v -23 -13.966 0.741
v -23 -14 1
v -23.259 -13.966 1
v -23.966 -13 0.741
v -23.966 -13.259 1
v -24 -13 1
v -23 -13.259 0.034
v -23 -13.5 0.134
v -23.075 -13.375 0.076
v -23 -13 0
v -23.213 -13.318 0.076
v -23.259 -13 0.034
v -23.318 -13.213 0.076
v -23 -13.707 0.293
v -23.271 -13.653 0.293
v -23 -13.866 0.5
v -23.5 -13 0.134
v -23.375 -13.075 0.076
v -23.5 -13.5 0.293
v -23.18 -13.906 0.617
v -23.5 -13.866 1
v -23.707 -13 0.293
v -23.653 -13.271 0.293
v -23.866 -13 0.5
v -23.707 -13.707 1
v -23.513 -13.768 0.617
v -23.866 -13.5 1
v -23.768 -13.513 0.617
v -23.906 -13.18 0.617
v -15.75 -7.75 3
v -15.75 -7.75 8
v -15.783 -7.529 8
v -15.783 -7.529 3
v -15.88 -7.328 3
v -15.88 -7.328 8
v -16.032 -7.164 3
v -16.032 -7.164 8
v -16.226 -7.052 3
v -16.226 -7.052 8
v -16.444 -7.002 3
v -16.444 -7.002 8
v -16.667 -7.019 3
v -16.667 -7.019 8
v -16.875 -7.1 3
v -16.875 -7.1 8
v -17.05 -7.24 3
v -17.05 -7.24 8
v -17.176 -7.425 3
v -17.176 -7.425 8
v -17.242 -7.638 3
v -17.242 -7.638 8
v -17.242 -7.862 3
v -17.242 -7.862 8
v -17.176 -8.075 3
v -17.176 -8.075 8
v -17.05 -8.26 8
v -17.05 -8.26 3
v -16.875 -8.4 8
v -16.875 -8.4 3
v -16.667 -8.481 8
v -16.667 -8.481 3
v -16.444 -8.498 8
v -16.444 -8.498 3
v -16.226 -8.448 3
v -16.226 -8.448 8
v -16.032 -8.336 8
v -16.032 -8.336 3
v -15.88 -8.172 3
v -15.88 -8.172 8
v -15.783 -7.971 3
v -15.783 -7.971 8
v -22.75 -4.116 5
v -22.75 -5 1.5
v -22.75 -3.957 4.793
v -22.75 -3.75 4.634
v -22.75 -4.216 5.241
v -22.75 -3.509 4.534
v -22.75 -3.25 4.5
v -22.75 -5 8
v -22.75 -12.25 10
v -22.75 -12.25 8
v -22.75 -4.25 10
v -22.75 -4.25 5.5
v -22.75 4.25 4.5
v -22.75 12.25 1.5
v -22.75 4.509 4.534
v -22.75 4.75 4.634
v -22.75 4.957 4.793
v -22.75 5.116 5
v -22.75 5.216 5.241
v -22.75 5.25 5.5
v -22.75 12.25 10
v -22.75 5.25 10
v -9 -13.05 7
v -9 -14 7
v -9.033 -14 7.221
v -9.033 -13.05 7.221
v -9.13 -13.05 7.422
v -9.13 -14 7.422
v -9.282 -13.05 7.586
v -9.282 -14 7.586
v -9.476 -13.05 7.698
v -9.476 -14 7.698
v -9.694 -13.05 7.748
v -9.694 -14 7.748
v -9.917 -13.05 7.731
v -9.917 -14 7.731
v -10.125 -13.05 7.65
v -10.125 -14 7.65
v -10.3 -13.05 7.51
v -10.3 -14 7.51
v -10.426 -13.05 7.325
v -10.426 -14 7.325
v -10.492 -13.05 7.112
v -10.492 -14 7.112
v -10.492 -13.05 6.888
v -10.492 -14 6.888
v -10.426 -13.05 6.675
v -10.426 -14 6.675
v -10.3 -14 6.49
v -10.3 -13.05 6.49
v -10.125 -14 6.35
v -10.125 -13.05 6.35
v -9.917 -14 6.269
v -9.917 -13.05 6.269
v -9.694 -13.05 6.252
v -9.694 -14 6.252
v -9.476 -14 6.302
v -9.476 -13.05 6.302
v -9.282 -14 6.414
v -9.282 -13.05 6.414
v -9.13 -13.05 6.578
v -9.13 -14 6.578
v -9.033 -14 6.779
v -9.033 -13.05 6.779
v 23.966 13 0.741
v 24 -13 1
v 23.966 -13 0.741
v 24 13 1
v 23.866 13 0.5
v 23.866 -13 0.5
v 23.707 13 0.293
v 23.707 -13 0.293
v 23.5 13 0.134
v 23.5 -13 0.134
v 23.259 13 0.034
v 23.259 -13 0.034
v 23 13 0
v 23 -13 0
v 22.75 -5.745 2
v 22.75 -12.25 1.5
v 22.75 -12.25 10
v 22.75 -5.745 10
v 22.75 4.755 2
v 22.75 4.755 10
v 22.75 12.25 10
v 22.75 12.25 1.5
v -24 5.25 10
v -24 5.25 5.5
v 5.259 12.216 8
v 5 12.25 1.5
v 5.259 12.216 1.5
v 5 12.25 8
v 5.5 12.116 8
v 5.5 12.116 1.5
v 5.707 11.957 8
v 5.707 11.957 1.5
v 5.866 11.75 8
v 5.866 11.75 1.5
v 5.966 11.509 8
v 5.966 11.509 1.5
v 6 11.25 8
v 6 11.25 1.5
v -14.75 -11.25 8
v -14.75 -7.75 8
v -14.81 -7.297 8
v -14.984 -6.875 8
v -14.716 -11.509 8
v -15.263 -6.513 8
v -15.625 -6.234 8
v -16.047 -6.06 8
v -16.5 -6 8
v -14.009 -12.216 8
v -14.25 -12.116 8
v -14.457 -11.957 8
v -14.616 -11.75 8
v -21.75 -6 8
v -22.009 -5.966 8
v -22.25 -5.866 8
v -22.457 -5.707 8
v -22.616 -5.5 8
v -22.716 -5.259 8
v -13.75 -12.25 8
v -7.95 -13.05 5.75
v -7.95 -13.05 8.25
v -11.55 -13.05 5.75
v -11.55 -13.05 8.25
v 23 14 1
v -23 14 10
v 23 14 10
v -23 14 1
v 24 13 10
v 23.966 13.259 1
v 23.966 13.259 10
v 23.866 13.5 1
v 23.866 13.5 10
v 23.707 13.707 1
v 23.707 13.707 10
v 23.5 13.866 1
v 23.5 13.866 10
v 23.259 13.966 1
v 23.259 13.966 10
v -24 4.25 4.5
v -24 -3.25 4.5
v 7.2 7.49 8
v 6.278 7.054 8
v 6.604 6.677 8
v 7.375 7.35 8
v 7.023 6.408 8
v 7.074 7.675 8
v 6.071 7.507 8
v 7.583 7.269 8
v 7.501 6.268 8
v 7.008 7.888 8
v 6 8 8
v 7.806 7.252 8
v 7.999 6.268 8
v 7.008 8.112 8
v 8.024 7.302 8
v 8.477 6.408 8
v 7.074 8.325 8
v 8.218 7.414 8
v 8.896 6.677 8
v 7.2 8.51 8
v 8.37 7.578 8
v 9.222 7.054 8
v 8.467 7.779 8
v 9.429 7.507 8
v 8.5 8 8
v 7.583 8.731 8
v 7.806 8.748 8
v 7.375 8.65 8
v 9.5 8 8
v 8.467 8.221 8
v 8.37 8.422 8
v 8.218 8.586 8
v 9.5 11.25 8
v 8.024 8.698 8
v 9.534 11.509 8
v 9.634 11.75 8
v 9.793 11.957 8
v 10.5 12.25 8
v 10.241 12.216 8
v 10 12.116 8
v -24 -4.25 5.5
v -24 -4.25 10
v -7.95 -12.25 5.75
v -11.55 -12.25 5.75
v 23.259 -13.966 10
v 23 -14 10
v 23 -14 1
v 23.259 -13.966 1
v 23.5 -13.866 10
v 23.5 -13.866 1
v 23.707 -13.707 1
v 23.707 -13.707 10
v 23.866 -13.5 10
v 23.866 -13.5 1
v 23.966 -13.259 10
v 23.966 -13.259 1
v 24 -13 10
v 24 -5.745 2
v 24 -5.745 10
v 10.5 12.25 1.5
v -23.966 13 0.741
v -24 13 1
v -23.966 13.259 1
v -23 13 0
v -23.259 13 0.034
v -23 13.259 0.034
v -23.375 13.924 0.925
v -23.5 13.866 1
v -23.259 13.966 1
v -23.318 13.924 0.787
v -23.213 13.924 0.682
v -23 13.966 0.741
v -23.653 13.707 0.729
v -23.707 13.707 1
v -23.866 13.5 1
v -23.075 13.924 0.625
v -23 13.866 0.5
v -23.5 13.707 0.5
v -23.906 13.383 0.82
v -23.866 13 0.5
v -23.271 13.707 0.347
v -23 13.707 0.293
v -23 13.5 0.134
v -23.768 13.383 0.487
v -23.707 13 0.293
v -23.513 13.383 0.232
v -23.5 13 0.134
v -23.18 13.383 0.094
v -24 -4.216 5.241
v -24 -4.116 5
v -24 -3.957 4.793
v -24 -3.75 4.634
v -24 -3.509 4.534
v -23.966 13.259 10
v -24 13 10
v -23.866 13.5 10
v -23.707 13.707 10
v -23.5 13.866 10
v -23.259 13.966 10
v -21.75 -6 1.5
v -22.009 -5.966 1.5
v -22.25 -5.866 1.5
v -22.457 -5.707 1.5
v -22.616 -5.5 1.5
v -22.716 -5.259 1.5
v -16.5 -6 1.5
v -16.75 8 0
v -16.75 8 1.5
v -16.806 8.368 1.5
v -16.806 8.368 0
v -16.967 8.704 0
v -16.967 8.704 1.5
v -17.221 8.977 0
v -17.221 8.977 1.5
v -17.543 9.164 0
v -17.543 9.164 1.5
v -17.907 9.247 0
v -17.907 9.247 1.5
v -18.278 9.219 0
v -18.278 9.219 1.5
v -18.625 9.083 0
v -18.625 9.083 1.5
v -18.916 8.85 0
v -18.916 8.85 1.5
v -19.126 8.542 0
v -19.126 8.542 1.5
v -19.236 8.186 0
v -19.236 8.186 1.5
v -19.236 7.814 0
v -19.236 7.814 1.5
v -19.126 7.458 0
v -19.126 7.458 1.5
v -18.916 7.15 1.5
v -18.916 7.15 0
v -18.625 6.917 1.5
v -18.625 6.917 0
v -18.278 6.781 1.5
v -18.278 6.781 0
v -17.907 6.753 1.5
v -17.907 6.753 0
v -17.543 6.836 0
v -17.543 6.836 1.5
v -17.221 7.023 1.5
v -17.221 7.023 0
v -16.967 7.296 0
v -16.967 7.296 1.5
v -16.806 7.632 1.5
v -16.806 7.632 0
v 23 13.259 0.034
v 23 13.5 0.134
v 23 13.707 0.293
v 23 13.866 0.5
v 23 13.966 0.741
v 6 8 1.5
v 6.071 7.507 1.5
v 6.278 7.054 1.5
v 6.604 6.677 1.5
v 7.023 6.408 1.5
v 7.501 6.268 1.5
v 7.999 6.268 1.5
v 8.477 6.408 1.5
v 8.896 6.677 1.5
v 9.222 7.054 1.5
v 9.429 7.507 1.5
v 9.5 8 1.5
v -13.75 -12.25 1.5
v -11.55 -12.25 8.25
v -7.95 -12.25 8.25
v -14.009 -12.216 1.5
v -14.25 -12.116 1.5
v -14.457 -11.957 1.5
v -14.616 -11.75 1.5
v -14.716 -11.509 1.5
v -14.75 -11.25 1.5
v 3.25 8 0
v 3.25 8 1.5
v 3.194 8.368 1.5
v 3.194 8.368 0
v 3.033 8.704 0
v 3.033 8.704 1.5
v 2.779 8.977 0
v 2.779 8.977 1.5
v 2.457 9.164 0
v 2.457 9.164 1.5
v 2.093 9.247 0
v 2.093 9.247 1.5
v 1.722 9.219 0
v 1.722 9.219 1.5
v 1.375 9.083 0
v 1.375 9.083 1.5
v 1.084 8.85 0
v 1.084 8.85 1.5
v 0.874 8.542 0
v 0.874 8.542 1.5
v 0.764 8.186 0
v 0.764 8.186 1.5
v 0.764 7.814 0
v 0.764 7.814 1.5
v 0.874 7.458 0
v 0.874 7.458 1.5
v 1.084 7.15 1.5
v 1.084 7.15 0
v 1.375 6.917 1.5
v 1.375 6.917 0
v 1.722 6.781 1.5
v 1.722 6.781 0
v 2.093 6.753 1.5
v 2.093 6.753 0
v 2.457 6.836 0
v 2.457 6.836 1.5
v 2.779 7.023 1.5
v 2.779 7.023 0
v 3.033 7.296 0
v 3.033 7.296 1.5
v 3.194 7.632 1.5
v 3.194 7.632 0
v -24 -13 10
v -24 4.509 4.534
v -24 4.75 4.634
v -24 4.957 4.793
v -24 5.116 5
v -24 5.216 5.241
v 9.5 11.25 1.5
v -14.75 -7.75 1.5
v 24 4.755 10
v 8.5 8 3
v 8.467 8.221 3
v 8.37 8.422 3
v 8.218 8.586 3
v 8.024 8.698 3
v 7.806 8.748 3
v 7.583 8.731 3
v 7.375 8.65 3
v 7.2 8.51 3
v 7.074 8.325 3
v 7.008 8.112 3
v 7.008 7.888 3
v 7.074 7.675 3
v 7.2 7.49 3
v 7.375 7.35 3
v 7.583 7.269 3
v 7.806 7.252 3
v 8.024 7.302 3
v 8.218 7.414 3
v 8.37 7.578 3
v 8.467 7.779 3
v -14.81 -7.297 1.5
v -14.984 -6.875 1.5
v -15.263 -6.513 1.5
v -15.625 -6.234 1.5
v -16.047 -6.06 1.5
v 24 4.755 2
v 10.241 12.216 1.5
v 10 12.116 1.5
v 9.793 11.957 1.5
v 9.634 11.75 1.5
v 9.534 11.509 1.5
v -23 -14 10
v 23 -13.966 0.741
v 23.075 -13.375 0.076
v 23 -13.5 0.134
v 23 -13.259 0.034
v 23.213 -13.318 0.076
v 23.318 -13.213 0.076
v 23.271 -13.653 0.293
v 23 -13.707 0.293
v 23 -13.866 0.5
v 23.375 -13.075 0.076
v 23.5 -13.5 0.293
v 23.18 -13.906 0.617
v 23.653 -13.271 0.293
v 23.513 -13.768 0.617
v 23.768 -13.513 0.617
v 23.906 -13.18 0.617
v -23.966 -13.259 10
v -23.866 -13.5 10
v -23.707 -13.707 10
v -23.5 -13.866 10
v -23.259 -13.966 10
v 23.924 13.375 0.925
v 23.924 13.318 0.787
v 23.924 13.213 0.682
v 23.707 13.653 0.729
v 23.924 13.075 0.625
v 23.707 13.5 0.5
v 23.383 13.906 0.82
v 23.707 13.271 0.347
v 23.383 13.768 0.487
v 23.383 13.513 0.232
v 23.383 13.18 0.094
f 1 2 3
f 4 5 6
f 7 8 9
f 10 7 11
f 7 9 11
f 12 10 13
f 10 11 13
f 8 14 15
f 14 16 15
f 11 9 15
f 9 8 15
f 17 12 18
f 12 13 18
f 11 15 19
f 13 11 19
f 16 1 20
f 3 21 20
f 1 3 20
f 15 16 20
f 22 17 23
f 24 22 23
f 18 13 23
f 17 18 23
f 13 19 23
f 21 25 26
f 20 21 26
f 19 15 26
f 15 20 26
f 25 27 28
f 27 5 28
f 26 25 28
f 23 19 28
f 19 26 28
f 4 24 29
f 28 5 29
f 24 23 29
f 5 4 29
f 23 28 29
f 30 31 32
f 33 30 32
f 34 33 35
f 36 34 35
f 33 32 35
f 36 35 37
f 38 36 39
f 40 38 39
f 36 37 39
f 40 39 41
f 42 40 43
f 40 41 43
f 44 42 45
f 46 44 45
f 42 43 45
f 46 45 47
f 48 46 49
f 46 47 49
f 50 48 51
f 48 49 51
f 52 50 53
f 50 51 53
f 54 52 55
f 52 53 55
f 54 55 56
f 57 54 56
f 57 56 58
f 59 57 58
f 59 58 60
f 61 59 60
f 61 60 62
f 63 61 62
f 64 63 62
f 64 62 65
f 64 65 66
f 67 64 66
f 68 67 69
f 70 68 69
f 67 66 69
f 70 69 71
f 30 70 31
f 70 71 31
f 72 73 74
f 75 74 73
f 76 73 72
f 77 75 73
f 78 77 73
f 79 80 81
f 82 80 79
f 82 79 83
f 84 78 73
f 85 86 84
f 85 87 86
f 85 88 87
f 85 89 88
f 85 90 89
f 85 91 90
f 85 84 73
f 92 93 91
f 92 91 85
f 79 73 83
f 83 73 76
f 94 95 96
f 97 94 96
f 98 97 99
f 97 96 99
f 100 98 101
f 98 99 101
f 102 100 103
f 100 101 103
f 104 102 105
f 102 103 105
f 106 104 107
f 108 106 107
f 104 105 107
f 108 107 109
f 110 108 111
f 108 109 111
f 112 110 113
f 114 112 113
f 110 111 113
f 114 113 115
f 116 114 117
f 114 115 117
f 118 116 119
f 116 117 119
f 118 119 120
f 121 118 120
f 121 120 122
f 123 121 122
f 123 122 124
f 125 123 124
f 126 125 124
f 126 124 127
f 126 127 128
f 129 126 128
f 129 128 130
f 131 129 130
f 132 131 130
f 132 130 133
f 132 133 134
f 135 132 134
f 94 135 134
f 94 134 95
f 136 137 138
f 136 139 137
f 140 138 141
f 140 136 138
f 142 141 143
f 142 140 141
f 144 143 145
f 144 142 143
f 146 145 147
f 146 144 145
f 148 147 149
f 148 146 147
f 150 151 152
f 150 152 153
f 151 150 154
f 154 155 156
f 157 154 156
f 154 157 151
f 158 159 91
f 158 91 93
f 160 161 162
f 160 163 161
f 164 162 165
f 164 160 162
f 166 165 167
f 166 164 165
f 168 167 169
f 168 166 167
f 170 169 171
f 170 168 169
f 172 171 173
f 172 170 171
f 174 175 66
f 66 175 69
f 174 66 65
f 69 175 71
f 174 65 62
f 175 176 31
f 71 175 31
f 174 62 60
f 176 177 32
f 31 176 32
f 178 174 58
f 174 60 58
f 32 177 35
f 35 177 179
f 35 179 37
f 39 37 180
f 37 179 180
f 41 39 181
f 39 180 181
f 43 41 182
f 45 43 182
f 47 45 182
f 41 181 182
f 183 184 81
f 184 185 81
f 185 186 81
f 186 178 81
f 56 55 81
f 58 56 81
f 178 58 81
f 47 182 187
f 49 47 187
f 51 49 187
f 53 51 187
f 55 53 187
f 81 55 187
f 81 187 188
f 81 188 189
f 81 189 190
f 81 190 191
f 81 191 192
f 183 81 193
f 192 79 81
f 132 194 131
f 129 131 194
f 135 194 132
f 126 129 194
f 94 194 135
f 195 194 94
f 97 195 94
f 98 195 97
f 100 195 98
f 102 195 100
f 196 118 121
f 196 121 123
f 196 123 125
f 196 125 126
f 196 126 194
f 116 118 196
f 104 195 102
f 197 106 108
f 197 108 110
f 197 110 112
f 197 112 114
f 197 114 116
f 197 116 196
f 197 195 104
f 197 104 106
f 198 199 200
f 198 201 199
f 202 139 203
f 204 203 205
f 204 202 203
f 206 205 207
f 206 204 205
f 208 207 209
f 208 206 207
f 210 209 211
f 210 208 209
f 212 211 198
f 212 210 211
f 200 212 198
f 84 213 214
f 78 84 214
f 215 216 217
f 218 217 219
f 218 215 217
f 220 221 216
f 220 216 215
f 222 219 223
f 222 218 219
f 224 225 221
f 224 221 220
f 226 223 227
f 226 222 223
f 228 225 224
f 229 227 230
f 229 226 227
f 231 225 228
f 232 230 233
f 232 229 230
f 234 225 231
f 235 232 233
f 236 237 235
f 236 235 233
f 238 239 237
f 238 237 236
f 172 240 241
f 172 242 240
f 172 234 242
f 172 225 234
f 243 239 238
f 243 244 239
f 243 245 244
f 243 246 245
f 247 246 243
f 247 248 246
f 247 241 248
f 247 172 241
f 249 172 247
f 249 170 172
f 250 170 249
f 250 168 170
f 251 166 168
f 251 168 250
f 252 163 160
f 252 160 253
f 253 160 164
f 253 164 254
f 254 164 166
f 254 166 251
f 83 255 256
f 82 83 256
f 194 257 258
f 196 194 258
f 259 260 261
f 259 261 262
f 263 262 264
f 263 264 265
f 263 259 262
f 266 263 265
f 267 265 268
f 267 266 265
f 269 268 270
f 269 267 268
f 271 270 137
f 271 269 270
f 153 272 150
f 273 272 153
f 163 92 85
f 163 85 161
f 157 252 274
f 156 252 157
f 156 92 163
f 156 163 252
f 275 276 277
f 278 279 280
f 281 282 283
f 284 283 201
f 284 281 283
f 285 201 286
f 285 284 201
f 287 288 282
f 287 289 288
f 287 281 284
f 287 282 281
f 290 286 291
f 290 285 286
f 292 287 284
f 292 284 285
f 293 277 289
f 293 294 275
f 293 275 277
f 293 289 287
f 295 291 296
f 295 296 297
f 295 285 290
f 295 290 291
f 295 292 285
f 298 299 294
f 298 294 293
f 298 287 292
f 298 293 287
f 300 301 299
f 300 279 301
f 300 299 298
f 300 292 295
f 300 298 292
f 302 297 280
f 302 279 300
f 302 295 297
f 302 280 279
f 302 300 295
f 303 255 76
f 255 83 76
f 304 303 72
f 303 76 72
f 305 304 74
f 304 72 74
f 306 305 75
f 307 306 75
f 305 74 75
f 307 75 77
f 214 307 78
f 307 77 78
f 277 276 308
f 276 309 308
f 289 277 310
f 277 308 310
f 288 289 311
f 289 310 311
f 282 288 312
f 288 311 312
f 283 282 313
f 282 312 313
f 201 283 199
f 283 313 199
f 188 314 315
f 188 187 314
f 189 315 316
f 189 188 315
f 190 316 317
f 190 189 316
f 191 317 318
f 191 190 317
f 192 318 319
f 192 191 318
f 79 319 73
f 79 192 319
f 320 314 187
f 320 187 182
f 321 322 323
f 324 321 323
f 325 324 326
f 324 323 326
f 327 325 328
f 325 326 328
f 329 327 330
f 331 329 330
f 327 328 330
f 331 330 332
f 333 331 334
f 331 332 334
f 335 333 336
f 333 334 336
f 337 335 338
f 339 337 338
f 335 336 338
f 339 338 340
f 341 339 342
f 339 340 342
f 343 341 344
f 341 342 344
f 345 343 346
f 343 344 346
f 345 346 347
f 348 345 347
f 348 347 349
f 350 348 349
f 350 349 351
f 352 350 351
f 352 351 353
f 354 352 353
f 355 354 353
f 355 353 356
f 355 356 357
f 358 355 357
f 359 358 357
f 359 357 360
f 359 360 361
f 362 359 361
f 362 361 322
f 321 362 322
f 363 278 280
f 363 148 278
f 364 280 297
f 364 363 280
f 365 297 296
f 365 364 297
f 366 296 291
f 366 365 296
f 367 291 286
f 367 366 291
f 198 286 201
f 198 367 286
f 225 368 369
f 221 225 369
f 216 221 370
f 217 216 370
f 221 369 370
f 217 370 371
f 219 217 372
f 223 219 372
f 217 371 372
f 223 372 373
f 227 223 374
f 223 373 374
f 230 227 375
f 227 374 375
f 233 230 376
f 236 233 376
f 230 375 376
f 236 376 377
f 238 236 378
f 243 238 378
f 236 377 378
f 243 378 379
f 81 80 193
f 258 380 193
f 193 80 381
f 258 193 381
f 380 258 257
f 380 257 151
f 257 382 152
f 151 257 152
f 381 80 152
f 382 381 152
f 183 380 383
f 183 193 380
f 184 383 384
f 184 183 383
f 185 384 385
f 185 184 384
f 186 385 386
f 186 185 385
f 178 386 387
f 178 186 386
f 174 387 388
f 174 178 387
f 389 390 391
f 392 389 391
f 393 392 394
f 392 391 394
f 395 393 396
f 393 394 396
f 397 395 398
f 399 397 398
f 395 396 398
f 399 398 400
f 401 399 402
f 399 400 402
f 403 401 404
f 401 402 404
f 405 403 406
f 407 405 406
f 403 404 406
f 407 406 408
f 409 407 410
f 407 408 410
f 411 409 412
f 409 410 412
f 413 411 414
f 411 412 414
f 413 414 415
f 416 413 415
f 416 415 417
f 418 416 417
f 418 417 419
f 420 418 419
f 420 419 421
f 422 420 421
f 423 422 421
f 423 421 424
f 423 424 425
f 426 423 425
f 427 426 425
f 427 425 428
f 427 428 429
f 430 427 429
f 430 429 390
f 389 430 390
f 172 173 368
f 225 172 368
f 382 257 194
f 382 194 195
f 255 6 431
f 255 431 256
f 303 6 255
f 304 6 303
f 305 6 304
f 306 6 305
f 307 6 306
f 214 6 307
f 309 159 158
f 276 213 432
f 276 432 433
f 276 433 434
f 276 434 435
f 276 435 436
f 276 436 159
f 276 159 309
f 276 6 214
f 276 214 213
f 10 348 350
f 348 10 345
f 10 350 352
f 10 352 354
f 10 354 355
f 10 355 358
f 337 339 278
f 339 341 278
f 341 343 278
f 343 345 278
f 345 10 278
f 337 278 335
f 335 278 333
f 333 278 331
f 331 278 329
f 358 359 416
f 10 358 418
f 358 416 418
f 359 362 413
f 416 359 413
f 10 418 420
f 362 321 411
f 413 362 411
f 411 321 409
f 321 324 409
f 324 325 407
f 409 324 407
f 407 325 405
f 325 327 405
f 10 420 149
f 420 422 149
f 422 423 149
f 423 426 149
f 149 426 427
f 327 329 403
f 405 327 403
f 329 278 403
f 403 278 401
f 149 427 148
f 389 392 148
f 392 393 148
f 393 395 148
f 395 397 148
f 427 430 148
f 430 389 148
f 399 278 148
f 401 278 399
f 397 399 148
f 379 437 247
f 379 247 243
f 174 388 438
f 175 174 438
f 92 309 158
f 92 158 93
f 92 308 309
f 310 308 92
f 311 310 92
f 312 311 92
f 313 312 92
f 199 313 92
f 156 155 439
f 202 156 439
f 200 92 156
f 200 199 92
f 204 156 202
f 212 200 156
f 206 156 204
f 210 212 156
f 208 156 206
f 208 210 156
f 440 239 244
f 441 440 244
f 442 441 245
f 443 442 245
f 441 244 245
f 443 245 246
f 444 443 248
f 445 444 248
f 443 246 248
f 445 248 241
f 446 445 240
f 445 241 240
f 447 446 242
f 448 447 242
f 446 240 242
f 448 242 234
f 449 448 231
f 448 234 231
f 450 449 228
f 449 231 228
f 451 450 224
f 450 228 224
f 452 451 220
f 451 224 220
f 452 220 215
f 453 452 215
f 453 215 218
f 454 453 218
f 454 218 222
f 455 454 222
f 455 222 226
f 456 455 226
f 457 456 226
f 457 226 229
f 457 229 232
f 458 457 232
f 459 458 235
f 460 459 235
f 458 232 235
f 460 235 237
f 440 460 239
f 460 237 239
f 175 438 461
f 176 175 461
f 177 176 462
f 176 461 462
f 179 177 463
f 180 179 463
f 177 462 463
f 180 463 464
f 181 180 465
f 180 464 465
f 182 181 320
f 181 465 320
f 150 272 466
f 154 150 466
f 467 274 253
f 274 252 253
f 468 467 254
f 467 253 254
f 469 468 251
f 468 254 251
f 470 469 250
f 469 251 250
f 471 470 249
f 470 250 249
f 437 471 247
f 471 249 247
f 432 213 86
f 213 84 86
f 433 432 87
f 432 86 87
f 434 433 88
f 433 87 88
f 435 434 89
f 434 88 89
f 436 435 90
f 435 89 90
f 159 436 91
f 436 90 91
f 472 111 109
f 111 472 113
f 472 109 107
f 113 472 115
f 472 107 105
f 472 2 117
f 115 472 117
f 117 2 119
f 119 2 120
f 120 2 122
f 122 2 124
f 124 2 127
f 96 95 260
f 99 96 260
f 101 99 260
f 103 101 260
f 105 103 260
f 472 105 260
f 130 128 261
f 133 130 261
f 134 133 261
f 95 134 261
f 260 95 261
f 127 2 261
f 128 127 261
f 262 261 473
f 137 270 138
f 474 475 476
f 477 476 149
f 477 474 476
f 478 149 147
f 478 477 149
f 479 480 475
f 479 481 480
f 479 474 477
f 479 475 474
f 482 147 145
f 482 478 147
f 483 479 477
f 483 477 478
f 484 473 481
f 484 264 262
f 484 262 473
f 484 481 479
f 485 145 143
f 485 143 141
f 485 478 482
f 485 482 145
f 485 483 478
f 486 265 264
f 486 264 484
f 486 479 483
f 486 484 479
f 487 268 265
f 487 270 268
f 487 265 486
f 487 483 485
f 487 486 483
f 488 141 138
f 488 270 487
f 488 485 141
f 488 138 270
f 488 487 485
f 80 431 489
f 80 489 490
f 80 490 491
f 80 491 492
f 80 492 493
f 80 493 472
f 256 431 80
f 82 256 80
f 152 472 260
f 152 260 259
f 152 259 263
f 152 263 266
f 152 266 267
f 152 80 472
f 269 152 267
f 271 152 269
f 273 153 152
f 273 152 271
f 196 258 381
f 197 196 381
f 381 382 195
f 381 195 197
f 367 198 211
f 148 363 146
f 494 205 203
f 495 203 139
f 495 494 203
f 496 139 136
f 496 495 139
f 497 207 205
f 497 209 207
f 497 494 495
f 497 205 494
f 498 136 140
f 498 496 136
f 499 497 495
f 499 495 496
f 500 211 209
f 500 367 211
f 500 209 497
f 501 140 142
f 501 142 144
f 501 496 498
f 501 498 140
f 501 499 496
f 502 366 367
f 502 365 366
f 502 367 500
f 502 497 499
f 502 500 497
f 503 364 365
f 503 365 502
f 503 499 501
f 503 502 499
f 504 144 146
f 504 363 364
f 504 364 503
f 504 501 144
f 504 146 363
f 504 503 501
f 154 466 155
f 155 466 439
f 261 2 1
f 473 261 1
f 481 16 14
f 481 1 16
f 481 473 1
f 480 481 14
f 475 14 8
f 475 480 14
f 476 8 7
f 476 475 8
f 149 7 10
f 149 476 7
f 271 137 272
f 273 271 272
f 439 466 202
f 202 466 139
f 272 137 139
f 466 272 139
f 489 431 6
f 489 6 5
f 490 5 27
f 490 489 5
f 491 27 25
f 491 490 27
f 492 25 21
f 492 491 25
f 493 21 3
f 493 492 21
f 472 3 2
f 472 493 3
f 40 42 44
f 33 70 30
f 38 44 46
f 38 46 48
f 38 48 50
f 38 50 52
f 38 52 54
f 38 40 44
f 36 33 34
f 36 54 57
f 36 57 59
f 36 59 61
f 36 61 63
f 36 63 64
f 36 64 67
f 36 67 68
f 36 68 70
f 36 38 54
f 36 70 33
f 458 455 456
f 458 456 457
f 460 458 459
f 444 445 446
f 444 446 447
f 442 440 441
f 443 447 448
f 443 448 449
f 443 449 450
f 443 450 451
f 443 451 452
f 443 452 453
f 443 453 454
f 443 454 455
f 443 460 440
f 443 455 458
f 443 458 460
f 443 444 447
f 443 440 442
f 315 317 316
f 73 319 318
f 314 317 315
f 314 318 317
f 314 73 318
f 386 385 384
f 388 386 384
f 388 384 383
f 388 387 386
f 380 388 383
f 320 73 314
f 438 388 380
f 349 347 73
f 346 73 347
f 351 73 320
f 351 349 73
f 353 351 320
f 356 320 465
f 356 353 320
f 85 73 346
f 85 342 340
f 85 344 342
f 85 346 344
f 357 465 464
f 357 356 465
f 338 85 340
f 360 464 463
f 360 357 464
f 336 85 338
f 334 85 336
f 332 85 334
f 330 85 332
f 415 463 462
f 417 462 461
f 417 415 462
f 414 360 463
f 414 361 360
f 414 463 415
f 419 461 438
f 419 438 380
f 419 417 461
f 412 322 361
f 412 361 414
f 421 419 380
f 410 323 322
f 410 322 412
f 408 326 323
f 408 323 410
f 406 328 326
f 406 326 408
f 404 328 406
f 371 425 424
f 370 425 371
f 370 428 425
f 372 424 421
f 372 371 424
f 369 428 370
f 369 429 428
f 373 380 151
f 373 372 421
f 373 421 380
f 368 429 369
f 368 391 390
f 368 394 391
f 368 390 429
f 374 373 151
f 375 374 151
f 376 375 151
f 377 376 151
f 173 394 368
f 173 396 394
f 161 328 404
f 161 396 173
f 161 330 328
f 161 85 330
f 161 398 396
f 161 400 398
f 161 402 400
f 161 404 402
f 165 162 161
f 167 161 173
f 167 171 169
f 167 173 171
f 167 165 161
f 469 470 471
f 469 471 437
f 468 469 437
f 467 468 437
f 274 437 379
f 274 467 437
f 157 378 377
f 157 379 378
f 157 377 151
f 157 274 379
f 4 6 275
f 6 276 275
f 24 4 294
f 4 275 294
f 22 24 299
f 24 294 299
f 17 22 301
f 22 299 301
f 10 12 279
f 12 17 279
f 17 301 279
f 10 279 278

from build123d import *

# Parameters (mm, degrees)
SKETCH_W        = 48
SKETCH_H        = 28
PAD_DEPTH       = 10
SKETCH001_W     = 45.5
SKETCH001_H     = 24.5
POCKET_DEPTH    = 8.5
PAD001_DEPTH    = 6.5
SKETCH003_R     = 0.75
POCKET001_DEPTH = 5
SKETCH004_W     = 9.5
SKETCH004_H     = 5.5
POCKET002_DEPTH = 1.25
SKETCH005_W     = 10.5
SKETCH005_H     = 8
POCKET003_DEPTH = 1.25
FILLET_R        = 1
FILLET001_R     = 1
SKETCH012_R     = 0.75
POCKET007_DEPTH = 1.75
SKETCH013_W     = 3.6
SKETCH013_H     = 2.5
POCKET008_DEPTH = 0.8
SKETCH015_R     = 1.25
POCKET009_DEPTH = 1.501


with BuildPart() as part:
    # Sketch → Pad (new body)
    with BuildSketch(Plane.XY):
        Rectangle(SKETCH_W, SKETCH_H)
    extrude(amount=PAD_DEPTH)

    # Sketch001 (on Face6 of Pad) → Pocket (cut)
    with BuildSketch(Plane.XY.offset(10)):
        Rectangle(SKETCH001_W, SKETCH001_H)
    extrude(amount=-POCKET_DEPTH, mode=Mode.SUBTRACT)

    # Sketch002 (on Face11 of Pocket) → Pad001 (join)
    with BuildSketch(Plane.XY.offset(1.5)):
        with BuildLine():
            Line((-22.75, -6), (-16.5, -6))
            ThreePointArc((-14.75, -7.75), (-15.262563, -6.512563), (-16.5, -6))
            Line((-14.75, -12.25), (-14.75, -7.75))
            Line((-22.75, -12.25), (-14.75, -12.25))
            Line((-22.75, -6), (-22.75, -12.25))
        make_face()
        with BuildLine():
            Line((6, 12.25), (6, 8))
            ThreePointArc((6, 8), (7.75, 6.25), (9.5, 8))
            Line((9.5, 12.25), (9.5, 8))
            Line((6, 12.25), (9.5, 12.25))
        make_face()
    extrude(amount=PAD001_DEPTH)

    # Sketch003 (on Face13 of Pad001) → Pocket001 (cut)
    with BuildSketch(Plane.XY.offset(8)):
        with Locations((-16.5, -7.75)):
            Circle(SKETCH003_R)
        with Locations((7.75, 8)):
            Circle(SKETCH003_R)
    extrude(amount=-POCKET001_DEPTH, mode=Mode.SUBTRACT)

    # Sketch004 (on Face2 of Pocket001) → Pocket002 (cut)
    with BuildSketch(Plane(origin=(-24, 0, 0), x_dir=(0, -1, 0), z_dir=(-1, 0, 0))):
        with Locations((-0.5, 7.25)):
            Rectangle(SKETCH004_W, SKETCH004_H)
    extrude(amount=-POCKET002_DEPTH, mode=Mode.SUBTRACT)

    # Sketch005 (on Face3 of Pocket002) → Pocket003 (cut)
    with BuildSketch(Plane.YZ.offset(24)):
        with Locations((-0.495, 6)):
            Rectangle(SKETCH005_W, SKETCH005_H)
    extrude(amount=-POCKET003_DEPTH, mode=Mode.SUBTRACT)

    # Fillet
    fillet_edges = [part.edges().sort_by_distance(p)[0] for p in [
        (-23.375, 5.25, 4.5),
        (-23.375, -4.25, 4.5),
        (-22.75, -6, 4.75),
        (-14.75, -12.25, 4.75),
        (6, 12.25, 4.75),
        (9.5, 12.25, 4.75),
    ]]
    fillet(fillet_edges, radius=FILLET_R)

    # Fillet001
    fillet001_edges = [part.edges().sort_by_distance(p)[0] for p in [
        (-24, -14, 5),
        (24, -14, 5),
        (0, -14, 0),
        (-24, 0, 0),
        (-24, 14, 5),
        (0, 14, 0),
        (24, 14, 5),
        (24, 0, 0),
    ]]
    fillet(fillet001_edges, radius=FILLET001_R)

    # Sketch012 (on Face15 of Fillet001) → Pocket007 (cut)
    with BuildSketch(Plane.XZ.offset(14)):
        with Locations((-9.75, 7)):
            Circle(SKETCH012_R)
    extrude(amount=-POCKET007_DEPTH, mode=Mode.SUBTRACT)

    # Sketch013 (on Face17 of Pocket007) → Pocket008 (cut)
    with BuildSketch(Plane(origin=(0, -12.25, 0), x_dir=(-1, 0, 0), z_dir=(0, 1, 0))):
        with Locations((9.75, 7)):
            Rectangle(SKETCH013_W, SKETCH013_H)
    extrude(amount=-POCKET008_DEPTH, mode=Mode.SUBTRACT)

    # Sketch015 (on Face31 of Pocket008) → Pocket009 (cut, through all)
    with BuildSketch(Plane.XY.offset(1.5)):
        with Locations((-18, 8)):
            Circle(SKETCH015_R)
        with Locations((2, 8)):
            Circle(SKETCH015_R)
    extrude(amount=-POCKET009_DEPTH, mode=Mode.SUBTRACT)


solid = part.part
